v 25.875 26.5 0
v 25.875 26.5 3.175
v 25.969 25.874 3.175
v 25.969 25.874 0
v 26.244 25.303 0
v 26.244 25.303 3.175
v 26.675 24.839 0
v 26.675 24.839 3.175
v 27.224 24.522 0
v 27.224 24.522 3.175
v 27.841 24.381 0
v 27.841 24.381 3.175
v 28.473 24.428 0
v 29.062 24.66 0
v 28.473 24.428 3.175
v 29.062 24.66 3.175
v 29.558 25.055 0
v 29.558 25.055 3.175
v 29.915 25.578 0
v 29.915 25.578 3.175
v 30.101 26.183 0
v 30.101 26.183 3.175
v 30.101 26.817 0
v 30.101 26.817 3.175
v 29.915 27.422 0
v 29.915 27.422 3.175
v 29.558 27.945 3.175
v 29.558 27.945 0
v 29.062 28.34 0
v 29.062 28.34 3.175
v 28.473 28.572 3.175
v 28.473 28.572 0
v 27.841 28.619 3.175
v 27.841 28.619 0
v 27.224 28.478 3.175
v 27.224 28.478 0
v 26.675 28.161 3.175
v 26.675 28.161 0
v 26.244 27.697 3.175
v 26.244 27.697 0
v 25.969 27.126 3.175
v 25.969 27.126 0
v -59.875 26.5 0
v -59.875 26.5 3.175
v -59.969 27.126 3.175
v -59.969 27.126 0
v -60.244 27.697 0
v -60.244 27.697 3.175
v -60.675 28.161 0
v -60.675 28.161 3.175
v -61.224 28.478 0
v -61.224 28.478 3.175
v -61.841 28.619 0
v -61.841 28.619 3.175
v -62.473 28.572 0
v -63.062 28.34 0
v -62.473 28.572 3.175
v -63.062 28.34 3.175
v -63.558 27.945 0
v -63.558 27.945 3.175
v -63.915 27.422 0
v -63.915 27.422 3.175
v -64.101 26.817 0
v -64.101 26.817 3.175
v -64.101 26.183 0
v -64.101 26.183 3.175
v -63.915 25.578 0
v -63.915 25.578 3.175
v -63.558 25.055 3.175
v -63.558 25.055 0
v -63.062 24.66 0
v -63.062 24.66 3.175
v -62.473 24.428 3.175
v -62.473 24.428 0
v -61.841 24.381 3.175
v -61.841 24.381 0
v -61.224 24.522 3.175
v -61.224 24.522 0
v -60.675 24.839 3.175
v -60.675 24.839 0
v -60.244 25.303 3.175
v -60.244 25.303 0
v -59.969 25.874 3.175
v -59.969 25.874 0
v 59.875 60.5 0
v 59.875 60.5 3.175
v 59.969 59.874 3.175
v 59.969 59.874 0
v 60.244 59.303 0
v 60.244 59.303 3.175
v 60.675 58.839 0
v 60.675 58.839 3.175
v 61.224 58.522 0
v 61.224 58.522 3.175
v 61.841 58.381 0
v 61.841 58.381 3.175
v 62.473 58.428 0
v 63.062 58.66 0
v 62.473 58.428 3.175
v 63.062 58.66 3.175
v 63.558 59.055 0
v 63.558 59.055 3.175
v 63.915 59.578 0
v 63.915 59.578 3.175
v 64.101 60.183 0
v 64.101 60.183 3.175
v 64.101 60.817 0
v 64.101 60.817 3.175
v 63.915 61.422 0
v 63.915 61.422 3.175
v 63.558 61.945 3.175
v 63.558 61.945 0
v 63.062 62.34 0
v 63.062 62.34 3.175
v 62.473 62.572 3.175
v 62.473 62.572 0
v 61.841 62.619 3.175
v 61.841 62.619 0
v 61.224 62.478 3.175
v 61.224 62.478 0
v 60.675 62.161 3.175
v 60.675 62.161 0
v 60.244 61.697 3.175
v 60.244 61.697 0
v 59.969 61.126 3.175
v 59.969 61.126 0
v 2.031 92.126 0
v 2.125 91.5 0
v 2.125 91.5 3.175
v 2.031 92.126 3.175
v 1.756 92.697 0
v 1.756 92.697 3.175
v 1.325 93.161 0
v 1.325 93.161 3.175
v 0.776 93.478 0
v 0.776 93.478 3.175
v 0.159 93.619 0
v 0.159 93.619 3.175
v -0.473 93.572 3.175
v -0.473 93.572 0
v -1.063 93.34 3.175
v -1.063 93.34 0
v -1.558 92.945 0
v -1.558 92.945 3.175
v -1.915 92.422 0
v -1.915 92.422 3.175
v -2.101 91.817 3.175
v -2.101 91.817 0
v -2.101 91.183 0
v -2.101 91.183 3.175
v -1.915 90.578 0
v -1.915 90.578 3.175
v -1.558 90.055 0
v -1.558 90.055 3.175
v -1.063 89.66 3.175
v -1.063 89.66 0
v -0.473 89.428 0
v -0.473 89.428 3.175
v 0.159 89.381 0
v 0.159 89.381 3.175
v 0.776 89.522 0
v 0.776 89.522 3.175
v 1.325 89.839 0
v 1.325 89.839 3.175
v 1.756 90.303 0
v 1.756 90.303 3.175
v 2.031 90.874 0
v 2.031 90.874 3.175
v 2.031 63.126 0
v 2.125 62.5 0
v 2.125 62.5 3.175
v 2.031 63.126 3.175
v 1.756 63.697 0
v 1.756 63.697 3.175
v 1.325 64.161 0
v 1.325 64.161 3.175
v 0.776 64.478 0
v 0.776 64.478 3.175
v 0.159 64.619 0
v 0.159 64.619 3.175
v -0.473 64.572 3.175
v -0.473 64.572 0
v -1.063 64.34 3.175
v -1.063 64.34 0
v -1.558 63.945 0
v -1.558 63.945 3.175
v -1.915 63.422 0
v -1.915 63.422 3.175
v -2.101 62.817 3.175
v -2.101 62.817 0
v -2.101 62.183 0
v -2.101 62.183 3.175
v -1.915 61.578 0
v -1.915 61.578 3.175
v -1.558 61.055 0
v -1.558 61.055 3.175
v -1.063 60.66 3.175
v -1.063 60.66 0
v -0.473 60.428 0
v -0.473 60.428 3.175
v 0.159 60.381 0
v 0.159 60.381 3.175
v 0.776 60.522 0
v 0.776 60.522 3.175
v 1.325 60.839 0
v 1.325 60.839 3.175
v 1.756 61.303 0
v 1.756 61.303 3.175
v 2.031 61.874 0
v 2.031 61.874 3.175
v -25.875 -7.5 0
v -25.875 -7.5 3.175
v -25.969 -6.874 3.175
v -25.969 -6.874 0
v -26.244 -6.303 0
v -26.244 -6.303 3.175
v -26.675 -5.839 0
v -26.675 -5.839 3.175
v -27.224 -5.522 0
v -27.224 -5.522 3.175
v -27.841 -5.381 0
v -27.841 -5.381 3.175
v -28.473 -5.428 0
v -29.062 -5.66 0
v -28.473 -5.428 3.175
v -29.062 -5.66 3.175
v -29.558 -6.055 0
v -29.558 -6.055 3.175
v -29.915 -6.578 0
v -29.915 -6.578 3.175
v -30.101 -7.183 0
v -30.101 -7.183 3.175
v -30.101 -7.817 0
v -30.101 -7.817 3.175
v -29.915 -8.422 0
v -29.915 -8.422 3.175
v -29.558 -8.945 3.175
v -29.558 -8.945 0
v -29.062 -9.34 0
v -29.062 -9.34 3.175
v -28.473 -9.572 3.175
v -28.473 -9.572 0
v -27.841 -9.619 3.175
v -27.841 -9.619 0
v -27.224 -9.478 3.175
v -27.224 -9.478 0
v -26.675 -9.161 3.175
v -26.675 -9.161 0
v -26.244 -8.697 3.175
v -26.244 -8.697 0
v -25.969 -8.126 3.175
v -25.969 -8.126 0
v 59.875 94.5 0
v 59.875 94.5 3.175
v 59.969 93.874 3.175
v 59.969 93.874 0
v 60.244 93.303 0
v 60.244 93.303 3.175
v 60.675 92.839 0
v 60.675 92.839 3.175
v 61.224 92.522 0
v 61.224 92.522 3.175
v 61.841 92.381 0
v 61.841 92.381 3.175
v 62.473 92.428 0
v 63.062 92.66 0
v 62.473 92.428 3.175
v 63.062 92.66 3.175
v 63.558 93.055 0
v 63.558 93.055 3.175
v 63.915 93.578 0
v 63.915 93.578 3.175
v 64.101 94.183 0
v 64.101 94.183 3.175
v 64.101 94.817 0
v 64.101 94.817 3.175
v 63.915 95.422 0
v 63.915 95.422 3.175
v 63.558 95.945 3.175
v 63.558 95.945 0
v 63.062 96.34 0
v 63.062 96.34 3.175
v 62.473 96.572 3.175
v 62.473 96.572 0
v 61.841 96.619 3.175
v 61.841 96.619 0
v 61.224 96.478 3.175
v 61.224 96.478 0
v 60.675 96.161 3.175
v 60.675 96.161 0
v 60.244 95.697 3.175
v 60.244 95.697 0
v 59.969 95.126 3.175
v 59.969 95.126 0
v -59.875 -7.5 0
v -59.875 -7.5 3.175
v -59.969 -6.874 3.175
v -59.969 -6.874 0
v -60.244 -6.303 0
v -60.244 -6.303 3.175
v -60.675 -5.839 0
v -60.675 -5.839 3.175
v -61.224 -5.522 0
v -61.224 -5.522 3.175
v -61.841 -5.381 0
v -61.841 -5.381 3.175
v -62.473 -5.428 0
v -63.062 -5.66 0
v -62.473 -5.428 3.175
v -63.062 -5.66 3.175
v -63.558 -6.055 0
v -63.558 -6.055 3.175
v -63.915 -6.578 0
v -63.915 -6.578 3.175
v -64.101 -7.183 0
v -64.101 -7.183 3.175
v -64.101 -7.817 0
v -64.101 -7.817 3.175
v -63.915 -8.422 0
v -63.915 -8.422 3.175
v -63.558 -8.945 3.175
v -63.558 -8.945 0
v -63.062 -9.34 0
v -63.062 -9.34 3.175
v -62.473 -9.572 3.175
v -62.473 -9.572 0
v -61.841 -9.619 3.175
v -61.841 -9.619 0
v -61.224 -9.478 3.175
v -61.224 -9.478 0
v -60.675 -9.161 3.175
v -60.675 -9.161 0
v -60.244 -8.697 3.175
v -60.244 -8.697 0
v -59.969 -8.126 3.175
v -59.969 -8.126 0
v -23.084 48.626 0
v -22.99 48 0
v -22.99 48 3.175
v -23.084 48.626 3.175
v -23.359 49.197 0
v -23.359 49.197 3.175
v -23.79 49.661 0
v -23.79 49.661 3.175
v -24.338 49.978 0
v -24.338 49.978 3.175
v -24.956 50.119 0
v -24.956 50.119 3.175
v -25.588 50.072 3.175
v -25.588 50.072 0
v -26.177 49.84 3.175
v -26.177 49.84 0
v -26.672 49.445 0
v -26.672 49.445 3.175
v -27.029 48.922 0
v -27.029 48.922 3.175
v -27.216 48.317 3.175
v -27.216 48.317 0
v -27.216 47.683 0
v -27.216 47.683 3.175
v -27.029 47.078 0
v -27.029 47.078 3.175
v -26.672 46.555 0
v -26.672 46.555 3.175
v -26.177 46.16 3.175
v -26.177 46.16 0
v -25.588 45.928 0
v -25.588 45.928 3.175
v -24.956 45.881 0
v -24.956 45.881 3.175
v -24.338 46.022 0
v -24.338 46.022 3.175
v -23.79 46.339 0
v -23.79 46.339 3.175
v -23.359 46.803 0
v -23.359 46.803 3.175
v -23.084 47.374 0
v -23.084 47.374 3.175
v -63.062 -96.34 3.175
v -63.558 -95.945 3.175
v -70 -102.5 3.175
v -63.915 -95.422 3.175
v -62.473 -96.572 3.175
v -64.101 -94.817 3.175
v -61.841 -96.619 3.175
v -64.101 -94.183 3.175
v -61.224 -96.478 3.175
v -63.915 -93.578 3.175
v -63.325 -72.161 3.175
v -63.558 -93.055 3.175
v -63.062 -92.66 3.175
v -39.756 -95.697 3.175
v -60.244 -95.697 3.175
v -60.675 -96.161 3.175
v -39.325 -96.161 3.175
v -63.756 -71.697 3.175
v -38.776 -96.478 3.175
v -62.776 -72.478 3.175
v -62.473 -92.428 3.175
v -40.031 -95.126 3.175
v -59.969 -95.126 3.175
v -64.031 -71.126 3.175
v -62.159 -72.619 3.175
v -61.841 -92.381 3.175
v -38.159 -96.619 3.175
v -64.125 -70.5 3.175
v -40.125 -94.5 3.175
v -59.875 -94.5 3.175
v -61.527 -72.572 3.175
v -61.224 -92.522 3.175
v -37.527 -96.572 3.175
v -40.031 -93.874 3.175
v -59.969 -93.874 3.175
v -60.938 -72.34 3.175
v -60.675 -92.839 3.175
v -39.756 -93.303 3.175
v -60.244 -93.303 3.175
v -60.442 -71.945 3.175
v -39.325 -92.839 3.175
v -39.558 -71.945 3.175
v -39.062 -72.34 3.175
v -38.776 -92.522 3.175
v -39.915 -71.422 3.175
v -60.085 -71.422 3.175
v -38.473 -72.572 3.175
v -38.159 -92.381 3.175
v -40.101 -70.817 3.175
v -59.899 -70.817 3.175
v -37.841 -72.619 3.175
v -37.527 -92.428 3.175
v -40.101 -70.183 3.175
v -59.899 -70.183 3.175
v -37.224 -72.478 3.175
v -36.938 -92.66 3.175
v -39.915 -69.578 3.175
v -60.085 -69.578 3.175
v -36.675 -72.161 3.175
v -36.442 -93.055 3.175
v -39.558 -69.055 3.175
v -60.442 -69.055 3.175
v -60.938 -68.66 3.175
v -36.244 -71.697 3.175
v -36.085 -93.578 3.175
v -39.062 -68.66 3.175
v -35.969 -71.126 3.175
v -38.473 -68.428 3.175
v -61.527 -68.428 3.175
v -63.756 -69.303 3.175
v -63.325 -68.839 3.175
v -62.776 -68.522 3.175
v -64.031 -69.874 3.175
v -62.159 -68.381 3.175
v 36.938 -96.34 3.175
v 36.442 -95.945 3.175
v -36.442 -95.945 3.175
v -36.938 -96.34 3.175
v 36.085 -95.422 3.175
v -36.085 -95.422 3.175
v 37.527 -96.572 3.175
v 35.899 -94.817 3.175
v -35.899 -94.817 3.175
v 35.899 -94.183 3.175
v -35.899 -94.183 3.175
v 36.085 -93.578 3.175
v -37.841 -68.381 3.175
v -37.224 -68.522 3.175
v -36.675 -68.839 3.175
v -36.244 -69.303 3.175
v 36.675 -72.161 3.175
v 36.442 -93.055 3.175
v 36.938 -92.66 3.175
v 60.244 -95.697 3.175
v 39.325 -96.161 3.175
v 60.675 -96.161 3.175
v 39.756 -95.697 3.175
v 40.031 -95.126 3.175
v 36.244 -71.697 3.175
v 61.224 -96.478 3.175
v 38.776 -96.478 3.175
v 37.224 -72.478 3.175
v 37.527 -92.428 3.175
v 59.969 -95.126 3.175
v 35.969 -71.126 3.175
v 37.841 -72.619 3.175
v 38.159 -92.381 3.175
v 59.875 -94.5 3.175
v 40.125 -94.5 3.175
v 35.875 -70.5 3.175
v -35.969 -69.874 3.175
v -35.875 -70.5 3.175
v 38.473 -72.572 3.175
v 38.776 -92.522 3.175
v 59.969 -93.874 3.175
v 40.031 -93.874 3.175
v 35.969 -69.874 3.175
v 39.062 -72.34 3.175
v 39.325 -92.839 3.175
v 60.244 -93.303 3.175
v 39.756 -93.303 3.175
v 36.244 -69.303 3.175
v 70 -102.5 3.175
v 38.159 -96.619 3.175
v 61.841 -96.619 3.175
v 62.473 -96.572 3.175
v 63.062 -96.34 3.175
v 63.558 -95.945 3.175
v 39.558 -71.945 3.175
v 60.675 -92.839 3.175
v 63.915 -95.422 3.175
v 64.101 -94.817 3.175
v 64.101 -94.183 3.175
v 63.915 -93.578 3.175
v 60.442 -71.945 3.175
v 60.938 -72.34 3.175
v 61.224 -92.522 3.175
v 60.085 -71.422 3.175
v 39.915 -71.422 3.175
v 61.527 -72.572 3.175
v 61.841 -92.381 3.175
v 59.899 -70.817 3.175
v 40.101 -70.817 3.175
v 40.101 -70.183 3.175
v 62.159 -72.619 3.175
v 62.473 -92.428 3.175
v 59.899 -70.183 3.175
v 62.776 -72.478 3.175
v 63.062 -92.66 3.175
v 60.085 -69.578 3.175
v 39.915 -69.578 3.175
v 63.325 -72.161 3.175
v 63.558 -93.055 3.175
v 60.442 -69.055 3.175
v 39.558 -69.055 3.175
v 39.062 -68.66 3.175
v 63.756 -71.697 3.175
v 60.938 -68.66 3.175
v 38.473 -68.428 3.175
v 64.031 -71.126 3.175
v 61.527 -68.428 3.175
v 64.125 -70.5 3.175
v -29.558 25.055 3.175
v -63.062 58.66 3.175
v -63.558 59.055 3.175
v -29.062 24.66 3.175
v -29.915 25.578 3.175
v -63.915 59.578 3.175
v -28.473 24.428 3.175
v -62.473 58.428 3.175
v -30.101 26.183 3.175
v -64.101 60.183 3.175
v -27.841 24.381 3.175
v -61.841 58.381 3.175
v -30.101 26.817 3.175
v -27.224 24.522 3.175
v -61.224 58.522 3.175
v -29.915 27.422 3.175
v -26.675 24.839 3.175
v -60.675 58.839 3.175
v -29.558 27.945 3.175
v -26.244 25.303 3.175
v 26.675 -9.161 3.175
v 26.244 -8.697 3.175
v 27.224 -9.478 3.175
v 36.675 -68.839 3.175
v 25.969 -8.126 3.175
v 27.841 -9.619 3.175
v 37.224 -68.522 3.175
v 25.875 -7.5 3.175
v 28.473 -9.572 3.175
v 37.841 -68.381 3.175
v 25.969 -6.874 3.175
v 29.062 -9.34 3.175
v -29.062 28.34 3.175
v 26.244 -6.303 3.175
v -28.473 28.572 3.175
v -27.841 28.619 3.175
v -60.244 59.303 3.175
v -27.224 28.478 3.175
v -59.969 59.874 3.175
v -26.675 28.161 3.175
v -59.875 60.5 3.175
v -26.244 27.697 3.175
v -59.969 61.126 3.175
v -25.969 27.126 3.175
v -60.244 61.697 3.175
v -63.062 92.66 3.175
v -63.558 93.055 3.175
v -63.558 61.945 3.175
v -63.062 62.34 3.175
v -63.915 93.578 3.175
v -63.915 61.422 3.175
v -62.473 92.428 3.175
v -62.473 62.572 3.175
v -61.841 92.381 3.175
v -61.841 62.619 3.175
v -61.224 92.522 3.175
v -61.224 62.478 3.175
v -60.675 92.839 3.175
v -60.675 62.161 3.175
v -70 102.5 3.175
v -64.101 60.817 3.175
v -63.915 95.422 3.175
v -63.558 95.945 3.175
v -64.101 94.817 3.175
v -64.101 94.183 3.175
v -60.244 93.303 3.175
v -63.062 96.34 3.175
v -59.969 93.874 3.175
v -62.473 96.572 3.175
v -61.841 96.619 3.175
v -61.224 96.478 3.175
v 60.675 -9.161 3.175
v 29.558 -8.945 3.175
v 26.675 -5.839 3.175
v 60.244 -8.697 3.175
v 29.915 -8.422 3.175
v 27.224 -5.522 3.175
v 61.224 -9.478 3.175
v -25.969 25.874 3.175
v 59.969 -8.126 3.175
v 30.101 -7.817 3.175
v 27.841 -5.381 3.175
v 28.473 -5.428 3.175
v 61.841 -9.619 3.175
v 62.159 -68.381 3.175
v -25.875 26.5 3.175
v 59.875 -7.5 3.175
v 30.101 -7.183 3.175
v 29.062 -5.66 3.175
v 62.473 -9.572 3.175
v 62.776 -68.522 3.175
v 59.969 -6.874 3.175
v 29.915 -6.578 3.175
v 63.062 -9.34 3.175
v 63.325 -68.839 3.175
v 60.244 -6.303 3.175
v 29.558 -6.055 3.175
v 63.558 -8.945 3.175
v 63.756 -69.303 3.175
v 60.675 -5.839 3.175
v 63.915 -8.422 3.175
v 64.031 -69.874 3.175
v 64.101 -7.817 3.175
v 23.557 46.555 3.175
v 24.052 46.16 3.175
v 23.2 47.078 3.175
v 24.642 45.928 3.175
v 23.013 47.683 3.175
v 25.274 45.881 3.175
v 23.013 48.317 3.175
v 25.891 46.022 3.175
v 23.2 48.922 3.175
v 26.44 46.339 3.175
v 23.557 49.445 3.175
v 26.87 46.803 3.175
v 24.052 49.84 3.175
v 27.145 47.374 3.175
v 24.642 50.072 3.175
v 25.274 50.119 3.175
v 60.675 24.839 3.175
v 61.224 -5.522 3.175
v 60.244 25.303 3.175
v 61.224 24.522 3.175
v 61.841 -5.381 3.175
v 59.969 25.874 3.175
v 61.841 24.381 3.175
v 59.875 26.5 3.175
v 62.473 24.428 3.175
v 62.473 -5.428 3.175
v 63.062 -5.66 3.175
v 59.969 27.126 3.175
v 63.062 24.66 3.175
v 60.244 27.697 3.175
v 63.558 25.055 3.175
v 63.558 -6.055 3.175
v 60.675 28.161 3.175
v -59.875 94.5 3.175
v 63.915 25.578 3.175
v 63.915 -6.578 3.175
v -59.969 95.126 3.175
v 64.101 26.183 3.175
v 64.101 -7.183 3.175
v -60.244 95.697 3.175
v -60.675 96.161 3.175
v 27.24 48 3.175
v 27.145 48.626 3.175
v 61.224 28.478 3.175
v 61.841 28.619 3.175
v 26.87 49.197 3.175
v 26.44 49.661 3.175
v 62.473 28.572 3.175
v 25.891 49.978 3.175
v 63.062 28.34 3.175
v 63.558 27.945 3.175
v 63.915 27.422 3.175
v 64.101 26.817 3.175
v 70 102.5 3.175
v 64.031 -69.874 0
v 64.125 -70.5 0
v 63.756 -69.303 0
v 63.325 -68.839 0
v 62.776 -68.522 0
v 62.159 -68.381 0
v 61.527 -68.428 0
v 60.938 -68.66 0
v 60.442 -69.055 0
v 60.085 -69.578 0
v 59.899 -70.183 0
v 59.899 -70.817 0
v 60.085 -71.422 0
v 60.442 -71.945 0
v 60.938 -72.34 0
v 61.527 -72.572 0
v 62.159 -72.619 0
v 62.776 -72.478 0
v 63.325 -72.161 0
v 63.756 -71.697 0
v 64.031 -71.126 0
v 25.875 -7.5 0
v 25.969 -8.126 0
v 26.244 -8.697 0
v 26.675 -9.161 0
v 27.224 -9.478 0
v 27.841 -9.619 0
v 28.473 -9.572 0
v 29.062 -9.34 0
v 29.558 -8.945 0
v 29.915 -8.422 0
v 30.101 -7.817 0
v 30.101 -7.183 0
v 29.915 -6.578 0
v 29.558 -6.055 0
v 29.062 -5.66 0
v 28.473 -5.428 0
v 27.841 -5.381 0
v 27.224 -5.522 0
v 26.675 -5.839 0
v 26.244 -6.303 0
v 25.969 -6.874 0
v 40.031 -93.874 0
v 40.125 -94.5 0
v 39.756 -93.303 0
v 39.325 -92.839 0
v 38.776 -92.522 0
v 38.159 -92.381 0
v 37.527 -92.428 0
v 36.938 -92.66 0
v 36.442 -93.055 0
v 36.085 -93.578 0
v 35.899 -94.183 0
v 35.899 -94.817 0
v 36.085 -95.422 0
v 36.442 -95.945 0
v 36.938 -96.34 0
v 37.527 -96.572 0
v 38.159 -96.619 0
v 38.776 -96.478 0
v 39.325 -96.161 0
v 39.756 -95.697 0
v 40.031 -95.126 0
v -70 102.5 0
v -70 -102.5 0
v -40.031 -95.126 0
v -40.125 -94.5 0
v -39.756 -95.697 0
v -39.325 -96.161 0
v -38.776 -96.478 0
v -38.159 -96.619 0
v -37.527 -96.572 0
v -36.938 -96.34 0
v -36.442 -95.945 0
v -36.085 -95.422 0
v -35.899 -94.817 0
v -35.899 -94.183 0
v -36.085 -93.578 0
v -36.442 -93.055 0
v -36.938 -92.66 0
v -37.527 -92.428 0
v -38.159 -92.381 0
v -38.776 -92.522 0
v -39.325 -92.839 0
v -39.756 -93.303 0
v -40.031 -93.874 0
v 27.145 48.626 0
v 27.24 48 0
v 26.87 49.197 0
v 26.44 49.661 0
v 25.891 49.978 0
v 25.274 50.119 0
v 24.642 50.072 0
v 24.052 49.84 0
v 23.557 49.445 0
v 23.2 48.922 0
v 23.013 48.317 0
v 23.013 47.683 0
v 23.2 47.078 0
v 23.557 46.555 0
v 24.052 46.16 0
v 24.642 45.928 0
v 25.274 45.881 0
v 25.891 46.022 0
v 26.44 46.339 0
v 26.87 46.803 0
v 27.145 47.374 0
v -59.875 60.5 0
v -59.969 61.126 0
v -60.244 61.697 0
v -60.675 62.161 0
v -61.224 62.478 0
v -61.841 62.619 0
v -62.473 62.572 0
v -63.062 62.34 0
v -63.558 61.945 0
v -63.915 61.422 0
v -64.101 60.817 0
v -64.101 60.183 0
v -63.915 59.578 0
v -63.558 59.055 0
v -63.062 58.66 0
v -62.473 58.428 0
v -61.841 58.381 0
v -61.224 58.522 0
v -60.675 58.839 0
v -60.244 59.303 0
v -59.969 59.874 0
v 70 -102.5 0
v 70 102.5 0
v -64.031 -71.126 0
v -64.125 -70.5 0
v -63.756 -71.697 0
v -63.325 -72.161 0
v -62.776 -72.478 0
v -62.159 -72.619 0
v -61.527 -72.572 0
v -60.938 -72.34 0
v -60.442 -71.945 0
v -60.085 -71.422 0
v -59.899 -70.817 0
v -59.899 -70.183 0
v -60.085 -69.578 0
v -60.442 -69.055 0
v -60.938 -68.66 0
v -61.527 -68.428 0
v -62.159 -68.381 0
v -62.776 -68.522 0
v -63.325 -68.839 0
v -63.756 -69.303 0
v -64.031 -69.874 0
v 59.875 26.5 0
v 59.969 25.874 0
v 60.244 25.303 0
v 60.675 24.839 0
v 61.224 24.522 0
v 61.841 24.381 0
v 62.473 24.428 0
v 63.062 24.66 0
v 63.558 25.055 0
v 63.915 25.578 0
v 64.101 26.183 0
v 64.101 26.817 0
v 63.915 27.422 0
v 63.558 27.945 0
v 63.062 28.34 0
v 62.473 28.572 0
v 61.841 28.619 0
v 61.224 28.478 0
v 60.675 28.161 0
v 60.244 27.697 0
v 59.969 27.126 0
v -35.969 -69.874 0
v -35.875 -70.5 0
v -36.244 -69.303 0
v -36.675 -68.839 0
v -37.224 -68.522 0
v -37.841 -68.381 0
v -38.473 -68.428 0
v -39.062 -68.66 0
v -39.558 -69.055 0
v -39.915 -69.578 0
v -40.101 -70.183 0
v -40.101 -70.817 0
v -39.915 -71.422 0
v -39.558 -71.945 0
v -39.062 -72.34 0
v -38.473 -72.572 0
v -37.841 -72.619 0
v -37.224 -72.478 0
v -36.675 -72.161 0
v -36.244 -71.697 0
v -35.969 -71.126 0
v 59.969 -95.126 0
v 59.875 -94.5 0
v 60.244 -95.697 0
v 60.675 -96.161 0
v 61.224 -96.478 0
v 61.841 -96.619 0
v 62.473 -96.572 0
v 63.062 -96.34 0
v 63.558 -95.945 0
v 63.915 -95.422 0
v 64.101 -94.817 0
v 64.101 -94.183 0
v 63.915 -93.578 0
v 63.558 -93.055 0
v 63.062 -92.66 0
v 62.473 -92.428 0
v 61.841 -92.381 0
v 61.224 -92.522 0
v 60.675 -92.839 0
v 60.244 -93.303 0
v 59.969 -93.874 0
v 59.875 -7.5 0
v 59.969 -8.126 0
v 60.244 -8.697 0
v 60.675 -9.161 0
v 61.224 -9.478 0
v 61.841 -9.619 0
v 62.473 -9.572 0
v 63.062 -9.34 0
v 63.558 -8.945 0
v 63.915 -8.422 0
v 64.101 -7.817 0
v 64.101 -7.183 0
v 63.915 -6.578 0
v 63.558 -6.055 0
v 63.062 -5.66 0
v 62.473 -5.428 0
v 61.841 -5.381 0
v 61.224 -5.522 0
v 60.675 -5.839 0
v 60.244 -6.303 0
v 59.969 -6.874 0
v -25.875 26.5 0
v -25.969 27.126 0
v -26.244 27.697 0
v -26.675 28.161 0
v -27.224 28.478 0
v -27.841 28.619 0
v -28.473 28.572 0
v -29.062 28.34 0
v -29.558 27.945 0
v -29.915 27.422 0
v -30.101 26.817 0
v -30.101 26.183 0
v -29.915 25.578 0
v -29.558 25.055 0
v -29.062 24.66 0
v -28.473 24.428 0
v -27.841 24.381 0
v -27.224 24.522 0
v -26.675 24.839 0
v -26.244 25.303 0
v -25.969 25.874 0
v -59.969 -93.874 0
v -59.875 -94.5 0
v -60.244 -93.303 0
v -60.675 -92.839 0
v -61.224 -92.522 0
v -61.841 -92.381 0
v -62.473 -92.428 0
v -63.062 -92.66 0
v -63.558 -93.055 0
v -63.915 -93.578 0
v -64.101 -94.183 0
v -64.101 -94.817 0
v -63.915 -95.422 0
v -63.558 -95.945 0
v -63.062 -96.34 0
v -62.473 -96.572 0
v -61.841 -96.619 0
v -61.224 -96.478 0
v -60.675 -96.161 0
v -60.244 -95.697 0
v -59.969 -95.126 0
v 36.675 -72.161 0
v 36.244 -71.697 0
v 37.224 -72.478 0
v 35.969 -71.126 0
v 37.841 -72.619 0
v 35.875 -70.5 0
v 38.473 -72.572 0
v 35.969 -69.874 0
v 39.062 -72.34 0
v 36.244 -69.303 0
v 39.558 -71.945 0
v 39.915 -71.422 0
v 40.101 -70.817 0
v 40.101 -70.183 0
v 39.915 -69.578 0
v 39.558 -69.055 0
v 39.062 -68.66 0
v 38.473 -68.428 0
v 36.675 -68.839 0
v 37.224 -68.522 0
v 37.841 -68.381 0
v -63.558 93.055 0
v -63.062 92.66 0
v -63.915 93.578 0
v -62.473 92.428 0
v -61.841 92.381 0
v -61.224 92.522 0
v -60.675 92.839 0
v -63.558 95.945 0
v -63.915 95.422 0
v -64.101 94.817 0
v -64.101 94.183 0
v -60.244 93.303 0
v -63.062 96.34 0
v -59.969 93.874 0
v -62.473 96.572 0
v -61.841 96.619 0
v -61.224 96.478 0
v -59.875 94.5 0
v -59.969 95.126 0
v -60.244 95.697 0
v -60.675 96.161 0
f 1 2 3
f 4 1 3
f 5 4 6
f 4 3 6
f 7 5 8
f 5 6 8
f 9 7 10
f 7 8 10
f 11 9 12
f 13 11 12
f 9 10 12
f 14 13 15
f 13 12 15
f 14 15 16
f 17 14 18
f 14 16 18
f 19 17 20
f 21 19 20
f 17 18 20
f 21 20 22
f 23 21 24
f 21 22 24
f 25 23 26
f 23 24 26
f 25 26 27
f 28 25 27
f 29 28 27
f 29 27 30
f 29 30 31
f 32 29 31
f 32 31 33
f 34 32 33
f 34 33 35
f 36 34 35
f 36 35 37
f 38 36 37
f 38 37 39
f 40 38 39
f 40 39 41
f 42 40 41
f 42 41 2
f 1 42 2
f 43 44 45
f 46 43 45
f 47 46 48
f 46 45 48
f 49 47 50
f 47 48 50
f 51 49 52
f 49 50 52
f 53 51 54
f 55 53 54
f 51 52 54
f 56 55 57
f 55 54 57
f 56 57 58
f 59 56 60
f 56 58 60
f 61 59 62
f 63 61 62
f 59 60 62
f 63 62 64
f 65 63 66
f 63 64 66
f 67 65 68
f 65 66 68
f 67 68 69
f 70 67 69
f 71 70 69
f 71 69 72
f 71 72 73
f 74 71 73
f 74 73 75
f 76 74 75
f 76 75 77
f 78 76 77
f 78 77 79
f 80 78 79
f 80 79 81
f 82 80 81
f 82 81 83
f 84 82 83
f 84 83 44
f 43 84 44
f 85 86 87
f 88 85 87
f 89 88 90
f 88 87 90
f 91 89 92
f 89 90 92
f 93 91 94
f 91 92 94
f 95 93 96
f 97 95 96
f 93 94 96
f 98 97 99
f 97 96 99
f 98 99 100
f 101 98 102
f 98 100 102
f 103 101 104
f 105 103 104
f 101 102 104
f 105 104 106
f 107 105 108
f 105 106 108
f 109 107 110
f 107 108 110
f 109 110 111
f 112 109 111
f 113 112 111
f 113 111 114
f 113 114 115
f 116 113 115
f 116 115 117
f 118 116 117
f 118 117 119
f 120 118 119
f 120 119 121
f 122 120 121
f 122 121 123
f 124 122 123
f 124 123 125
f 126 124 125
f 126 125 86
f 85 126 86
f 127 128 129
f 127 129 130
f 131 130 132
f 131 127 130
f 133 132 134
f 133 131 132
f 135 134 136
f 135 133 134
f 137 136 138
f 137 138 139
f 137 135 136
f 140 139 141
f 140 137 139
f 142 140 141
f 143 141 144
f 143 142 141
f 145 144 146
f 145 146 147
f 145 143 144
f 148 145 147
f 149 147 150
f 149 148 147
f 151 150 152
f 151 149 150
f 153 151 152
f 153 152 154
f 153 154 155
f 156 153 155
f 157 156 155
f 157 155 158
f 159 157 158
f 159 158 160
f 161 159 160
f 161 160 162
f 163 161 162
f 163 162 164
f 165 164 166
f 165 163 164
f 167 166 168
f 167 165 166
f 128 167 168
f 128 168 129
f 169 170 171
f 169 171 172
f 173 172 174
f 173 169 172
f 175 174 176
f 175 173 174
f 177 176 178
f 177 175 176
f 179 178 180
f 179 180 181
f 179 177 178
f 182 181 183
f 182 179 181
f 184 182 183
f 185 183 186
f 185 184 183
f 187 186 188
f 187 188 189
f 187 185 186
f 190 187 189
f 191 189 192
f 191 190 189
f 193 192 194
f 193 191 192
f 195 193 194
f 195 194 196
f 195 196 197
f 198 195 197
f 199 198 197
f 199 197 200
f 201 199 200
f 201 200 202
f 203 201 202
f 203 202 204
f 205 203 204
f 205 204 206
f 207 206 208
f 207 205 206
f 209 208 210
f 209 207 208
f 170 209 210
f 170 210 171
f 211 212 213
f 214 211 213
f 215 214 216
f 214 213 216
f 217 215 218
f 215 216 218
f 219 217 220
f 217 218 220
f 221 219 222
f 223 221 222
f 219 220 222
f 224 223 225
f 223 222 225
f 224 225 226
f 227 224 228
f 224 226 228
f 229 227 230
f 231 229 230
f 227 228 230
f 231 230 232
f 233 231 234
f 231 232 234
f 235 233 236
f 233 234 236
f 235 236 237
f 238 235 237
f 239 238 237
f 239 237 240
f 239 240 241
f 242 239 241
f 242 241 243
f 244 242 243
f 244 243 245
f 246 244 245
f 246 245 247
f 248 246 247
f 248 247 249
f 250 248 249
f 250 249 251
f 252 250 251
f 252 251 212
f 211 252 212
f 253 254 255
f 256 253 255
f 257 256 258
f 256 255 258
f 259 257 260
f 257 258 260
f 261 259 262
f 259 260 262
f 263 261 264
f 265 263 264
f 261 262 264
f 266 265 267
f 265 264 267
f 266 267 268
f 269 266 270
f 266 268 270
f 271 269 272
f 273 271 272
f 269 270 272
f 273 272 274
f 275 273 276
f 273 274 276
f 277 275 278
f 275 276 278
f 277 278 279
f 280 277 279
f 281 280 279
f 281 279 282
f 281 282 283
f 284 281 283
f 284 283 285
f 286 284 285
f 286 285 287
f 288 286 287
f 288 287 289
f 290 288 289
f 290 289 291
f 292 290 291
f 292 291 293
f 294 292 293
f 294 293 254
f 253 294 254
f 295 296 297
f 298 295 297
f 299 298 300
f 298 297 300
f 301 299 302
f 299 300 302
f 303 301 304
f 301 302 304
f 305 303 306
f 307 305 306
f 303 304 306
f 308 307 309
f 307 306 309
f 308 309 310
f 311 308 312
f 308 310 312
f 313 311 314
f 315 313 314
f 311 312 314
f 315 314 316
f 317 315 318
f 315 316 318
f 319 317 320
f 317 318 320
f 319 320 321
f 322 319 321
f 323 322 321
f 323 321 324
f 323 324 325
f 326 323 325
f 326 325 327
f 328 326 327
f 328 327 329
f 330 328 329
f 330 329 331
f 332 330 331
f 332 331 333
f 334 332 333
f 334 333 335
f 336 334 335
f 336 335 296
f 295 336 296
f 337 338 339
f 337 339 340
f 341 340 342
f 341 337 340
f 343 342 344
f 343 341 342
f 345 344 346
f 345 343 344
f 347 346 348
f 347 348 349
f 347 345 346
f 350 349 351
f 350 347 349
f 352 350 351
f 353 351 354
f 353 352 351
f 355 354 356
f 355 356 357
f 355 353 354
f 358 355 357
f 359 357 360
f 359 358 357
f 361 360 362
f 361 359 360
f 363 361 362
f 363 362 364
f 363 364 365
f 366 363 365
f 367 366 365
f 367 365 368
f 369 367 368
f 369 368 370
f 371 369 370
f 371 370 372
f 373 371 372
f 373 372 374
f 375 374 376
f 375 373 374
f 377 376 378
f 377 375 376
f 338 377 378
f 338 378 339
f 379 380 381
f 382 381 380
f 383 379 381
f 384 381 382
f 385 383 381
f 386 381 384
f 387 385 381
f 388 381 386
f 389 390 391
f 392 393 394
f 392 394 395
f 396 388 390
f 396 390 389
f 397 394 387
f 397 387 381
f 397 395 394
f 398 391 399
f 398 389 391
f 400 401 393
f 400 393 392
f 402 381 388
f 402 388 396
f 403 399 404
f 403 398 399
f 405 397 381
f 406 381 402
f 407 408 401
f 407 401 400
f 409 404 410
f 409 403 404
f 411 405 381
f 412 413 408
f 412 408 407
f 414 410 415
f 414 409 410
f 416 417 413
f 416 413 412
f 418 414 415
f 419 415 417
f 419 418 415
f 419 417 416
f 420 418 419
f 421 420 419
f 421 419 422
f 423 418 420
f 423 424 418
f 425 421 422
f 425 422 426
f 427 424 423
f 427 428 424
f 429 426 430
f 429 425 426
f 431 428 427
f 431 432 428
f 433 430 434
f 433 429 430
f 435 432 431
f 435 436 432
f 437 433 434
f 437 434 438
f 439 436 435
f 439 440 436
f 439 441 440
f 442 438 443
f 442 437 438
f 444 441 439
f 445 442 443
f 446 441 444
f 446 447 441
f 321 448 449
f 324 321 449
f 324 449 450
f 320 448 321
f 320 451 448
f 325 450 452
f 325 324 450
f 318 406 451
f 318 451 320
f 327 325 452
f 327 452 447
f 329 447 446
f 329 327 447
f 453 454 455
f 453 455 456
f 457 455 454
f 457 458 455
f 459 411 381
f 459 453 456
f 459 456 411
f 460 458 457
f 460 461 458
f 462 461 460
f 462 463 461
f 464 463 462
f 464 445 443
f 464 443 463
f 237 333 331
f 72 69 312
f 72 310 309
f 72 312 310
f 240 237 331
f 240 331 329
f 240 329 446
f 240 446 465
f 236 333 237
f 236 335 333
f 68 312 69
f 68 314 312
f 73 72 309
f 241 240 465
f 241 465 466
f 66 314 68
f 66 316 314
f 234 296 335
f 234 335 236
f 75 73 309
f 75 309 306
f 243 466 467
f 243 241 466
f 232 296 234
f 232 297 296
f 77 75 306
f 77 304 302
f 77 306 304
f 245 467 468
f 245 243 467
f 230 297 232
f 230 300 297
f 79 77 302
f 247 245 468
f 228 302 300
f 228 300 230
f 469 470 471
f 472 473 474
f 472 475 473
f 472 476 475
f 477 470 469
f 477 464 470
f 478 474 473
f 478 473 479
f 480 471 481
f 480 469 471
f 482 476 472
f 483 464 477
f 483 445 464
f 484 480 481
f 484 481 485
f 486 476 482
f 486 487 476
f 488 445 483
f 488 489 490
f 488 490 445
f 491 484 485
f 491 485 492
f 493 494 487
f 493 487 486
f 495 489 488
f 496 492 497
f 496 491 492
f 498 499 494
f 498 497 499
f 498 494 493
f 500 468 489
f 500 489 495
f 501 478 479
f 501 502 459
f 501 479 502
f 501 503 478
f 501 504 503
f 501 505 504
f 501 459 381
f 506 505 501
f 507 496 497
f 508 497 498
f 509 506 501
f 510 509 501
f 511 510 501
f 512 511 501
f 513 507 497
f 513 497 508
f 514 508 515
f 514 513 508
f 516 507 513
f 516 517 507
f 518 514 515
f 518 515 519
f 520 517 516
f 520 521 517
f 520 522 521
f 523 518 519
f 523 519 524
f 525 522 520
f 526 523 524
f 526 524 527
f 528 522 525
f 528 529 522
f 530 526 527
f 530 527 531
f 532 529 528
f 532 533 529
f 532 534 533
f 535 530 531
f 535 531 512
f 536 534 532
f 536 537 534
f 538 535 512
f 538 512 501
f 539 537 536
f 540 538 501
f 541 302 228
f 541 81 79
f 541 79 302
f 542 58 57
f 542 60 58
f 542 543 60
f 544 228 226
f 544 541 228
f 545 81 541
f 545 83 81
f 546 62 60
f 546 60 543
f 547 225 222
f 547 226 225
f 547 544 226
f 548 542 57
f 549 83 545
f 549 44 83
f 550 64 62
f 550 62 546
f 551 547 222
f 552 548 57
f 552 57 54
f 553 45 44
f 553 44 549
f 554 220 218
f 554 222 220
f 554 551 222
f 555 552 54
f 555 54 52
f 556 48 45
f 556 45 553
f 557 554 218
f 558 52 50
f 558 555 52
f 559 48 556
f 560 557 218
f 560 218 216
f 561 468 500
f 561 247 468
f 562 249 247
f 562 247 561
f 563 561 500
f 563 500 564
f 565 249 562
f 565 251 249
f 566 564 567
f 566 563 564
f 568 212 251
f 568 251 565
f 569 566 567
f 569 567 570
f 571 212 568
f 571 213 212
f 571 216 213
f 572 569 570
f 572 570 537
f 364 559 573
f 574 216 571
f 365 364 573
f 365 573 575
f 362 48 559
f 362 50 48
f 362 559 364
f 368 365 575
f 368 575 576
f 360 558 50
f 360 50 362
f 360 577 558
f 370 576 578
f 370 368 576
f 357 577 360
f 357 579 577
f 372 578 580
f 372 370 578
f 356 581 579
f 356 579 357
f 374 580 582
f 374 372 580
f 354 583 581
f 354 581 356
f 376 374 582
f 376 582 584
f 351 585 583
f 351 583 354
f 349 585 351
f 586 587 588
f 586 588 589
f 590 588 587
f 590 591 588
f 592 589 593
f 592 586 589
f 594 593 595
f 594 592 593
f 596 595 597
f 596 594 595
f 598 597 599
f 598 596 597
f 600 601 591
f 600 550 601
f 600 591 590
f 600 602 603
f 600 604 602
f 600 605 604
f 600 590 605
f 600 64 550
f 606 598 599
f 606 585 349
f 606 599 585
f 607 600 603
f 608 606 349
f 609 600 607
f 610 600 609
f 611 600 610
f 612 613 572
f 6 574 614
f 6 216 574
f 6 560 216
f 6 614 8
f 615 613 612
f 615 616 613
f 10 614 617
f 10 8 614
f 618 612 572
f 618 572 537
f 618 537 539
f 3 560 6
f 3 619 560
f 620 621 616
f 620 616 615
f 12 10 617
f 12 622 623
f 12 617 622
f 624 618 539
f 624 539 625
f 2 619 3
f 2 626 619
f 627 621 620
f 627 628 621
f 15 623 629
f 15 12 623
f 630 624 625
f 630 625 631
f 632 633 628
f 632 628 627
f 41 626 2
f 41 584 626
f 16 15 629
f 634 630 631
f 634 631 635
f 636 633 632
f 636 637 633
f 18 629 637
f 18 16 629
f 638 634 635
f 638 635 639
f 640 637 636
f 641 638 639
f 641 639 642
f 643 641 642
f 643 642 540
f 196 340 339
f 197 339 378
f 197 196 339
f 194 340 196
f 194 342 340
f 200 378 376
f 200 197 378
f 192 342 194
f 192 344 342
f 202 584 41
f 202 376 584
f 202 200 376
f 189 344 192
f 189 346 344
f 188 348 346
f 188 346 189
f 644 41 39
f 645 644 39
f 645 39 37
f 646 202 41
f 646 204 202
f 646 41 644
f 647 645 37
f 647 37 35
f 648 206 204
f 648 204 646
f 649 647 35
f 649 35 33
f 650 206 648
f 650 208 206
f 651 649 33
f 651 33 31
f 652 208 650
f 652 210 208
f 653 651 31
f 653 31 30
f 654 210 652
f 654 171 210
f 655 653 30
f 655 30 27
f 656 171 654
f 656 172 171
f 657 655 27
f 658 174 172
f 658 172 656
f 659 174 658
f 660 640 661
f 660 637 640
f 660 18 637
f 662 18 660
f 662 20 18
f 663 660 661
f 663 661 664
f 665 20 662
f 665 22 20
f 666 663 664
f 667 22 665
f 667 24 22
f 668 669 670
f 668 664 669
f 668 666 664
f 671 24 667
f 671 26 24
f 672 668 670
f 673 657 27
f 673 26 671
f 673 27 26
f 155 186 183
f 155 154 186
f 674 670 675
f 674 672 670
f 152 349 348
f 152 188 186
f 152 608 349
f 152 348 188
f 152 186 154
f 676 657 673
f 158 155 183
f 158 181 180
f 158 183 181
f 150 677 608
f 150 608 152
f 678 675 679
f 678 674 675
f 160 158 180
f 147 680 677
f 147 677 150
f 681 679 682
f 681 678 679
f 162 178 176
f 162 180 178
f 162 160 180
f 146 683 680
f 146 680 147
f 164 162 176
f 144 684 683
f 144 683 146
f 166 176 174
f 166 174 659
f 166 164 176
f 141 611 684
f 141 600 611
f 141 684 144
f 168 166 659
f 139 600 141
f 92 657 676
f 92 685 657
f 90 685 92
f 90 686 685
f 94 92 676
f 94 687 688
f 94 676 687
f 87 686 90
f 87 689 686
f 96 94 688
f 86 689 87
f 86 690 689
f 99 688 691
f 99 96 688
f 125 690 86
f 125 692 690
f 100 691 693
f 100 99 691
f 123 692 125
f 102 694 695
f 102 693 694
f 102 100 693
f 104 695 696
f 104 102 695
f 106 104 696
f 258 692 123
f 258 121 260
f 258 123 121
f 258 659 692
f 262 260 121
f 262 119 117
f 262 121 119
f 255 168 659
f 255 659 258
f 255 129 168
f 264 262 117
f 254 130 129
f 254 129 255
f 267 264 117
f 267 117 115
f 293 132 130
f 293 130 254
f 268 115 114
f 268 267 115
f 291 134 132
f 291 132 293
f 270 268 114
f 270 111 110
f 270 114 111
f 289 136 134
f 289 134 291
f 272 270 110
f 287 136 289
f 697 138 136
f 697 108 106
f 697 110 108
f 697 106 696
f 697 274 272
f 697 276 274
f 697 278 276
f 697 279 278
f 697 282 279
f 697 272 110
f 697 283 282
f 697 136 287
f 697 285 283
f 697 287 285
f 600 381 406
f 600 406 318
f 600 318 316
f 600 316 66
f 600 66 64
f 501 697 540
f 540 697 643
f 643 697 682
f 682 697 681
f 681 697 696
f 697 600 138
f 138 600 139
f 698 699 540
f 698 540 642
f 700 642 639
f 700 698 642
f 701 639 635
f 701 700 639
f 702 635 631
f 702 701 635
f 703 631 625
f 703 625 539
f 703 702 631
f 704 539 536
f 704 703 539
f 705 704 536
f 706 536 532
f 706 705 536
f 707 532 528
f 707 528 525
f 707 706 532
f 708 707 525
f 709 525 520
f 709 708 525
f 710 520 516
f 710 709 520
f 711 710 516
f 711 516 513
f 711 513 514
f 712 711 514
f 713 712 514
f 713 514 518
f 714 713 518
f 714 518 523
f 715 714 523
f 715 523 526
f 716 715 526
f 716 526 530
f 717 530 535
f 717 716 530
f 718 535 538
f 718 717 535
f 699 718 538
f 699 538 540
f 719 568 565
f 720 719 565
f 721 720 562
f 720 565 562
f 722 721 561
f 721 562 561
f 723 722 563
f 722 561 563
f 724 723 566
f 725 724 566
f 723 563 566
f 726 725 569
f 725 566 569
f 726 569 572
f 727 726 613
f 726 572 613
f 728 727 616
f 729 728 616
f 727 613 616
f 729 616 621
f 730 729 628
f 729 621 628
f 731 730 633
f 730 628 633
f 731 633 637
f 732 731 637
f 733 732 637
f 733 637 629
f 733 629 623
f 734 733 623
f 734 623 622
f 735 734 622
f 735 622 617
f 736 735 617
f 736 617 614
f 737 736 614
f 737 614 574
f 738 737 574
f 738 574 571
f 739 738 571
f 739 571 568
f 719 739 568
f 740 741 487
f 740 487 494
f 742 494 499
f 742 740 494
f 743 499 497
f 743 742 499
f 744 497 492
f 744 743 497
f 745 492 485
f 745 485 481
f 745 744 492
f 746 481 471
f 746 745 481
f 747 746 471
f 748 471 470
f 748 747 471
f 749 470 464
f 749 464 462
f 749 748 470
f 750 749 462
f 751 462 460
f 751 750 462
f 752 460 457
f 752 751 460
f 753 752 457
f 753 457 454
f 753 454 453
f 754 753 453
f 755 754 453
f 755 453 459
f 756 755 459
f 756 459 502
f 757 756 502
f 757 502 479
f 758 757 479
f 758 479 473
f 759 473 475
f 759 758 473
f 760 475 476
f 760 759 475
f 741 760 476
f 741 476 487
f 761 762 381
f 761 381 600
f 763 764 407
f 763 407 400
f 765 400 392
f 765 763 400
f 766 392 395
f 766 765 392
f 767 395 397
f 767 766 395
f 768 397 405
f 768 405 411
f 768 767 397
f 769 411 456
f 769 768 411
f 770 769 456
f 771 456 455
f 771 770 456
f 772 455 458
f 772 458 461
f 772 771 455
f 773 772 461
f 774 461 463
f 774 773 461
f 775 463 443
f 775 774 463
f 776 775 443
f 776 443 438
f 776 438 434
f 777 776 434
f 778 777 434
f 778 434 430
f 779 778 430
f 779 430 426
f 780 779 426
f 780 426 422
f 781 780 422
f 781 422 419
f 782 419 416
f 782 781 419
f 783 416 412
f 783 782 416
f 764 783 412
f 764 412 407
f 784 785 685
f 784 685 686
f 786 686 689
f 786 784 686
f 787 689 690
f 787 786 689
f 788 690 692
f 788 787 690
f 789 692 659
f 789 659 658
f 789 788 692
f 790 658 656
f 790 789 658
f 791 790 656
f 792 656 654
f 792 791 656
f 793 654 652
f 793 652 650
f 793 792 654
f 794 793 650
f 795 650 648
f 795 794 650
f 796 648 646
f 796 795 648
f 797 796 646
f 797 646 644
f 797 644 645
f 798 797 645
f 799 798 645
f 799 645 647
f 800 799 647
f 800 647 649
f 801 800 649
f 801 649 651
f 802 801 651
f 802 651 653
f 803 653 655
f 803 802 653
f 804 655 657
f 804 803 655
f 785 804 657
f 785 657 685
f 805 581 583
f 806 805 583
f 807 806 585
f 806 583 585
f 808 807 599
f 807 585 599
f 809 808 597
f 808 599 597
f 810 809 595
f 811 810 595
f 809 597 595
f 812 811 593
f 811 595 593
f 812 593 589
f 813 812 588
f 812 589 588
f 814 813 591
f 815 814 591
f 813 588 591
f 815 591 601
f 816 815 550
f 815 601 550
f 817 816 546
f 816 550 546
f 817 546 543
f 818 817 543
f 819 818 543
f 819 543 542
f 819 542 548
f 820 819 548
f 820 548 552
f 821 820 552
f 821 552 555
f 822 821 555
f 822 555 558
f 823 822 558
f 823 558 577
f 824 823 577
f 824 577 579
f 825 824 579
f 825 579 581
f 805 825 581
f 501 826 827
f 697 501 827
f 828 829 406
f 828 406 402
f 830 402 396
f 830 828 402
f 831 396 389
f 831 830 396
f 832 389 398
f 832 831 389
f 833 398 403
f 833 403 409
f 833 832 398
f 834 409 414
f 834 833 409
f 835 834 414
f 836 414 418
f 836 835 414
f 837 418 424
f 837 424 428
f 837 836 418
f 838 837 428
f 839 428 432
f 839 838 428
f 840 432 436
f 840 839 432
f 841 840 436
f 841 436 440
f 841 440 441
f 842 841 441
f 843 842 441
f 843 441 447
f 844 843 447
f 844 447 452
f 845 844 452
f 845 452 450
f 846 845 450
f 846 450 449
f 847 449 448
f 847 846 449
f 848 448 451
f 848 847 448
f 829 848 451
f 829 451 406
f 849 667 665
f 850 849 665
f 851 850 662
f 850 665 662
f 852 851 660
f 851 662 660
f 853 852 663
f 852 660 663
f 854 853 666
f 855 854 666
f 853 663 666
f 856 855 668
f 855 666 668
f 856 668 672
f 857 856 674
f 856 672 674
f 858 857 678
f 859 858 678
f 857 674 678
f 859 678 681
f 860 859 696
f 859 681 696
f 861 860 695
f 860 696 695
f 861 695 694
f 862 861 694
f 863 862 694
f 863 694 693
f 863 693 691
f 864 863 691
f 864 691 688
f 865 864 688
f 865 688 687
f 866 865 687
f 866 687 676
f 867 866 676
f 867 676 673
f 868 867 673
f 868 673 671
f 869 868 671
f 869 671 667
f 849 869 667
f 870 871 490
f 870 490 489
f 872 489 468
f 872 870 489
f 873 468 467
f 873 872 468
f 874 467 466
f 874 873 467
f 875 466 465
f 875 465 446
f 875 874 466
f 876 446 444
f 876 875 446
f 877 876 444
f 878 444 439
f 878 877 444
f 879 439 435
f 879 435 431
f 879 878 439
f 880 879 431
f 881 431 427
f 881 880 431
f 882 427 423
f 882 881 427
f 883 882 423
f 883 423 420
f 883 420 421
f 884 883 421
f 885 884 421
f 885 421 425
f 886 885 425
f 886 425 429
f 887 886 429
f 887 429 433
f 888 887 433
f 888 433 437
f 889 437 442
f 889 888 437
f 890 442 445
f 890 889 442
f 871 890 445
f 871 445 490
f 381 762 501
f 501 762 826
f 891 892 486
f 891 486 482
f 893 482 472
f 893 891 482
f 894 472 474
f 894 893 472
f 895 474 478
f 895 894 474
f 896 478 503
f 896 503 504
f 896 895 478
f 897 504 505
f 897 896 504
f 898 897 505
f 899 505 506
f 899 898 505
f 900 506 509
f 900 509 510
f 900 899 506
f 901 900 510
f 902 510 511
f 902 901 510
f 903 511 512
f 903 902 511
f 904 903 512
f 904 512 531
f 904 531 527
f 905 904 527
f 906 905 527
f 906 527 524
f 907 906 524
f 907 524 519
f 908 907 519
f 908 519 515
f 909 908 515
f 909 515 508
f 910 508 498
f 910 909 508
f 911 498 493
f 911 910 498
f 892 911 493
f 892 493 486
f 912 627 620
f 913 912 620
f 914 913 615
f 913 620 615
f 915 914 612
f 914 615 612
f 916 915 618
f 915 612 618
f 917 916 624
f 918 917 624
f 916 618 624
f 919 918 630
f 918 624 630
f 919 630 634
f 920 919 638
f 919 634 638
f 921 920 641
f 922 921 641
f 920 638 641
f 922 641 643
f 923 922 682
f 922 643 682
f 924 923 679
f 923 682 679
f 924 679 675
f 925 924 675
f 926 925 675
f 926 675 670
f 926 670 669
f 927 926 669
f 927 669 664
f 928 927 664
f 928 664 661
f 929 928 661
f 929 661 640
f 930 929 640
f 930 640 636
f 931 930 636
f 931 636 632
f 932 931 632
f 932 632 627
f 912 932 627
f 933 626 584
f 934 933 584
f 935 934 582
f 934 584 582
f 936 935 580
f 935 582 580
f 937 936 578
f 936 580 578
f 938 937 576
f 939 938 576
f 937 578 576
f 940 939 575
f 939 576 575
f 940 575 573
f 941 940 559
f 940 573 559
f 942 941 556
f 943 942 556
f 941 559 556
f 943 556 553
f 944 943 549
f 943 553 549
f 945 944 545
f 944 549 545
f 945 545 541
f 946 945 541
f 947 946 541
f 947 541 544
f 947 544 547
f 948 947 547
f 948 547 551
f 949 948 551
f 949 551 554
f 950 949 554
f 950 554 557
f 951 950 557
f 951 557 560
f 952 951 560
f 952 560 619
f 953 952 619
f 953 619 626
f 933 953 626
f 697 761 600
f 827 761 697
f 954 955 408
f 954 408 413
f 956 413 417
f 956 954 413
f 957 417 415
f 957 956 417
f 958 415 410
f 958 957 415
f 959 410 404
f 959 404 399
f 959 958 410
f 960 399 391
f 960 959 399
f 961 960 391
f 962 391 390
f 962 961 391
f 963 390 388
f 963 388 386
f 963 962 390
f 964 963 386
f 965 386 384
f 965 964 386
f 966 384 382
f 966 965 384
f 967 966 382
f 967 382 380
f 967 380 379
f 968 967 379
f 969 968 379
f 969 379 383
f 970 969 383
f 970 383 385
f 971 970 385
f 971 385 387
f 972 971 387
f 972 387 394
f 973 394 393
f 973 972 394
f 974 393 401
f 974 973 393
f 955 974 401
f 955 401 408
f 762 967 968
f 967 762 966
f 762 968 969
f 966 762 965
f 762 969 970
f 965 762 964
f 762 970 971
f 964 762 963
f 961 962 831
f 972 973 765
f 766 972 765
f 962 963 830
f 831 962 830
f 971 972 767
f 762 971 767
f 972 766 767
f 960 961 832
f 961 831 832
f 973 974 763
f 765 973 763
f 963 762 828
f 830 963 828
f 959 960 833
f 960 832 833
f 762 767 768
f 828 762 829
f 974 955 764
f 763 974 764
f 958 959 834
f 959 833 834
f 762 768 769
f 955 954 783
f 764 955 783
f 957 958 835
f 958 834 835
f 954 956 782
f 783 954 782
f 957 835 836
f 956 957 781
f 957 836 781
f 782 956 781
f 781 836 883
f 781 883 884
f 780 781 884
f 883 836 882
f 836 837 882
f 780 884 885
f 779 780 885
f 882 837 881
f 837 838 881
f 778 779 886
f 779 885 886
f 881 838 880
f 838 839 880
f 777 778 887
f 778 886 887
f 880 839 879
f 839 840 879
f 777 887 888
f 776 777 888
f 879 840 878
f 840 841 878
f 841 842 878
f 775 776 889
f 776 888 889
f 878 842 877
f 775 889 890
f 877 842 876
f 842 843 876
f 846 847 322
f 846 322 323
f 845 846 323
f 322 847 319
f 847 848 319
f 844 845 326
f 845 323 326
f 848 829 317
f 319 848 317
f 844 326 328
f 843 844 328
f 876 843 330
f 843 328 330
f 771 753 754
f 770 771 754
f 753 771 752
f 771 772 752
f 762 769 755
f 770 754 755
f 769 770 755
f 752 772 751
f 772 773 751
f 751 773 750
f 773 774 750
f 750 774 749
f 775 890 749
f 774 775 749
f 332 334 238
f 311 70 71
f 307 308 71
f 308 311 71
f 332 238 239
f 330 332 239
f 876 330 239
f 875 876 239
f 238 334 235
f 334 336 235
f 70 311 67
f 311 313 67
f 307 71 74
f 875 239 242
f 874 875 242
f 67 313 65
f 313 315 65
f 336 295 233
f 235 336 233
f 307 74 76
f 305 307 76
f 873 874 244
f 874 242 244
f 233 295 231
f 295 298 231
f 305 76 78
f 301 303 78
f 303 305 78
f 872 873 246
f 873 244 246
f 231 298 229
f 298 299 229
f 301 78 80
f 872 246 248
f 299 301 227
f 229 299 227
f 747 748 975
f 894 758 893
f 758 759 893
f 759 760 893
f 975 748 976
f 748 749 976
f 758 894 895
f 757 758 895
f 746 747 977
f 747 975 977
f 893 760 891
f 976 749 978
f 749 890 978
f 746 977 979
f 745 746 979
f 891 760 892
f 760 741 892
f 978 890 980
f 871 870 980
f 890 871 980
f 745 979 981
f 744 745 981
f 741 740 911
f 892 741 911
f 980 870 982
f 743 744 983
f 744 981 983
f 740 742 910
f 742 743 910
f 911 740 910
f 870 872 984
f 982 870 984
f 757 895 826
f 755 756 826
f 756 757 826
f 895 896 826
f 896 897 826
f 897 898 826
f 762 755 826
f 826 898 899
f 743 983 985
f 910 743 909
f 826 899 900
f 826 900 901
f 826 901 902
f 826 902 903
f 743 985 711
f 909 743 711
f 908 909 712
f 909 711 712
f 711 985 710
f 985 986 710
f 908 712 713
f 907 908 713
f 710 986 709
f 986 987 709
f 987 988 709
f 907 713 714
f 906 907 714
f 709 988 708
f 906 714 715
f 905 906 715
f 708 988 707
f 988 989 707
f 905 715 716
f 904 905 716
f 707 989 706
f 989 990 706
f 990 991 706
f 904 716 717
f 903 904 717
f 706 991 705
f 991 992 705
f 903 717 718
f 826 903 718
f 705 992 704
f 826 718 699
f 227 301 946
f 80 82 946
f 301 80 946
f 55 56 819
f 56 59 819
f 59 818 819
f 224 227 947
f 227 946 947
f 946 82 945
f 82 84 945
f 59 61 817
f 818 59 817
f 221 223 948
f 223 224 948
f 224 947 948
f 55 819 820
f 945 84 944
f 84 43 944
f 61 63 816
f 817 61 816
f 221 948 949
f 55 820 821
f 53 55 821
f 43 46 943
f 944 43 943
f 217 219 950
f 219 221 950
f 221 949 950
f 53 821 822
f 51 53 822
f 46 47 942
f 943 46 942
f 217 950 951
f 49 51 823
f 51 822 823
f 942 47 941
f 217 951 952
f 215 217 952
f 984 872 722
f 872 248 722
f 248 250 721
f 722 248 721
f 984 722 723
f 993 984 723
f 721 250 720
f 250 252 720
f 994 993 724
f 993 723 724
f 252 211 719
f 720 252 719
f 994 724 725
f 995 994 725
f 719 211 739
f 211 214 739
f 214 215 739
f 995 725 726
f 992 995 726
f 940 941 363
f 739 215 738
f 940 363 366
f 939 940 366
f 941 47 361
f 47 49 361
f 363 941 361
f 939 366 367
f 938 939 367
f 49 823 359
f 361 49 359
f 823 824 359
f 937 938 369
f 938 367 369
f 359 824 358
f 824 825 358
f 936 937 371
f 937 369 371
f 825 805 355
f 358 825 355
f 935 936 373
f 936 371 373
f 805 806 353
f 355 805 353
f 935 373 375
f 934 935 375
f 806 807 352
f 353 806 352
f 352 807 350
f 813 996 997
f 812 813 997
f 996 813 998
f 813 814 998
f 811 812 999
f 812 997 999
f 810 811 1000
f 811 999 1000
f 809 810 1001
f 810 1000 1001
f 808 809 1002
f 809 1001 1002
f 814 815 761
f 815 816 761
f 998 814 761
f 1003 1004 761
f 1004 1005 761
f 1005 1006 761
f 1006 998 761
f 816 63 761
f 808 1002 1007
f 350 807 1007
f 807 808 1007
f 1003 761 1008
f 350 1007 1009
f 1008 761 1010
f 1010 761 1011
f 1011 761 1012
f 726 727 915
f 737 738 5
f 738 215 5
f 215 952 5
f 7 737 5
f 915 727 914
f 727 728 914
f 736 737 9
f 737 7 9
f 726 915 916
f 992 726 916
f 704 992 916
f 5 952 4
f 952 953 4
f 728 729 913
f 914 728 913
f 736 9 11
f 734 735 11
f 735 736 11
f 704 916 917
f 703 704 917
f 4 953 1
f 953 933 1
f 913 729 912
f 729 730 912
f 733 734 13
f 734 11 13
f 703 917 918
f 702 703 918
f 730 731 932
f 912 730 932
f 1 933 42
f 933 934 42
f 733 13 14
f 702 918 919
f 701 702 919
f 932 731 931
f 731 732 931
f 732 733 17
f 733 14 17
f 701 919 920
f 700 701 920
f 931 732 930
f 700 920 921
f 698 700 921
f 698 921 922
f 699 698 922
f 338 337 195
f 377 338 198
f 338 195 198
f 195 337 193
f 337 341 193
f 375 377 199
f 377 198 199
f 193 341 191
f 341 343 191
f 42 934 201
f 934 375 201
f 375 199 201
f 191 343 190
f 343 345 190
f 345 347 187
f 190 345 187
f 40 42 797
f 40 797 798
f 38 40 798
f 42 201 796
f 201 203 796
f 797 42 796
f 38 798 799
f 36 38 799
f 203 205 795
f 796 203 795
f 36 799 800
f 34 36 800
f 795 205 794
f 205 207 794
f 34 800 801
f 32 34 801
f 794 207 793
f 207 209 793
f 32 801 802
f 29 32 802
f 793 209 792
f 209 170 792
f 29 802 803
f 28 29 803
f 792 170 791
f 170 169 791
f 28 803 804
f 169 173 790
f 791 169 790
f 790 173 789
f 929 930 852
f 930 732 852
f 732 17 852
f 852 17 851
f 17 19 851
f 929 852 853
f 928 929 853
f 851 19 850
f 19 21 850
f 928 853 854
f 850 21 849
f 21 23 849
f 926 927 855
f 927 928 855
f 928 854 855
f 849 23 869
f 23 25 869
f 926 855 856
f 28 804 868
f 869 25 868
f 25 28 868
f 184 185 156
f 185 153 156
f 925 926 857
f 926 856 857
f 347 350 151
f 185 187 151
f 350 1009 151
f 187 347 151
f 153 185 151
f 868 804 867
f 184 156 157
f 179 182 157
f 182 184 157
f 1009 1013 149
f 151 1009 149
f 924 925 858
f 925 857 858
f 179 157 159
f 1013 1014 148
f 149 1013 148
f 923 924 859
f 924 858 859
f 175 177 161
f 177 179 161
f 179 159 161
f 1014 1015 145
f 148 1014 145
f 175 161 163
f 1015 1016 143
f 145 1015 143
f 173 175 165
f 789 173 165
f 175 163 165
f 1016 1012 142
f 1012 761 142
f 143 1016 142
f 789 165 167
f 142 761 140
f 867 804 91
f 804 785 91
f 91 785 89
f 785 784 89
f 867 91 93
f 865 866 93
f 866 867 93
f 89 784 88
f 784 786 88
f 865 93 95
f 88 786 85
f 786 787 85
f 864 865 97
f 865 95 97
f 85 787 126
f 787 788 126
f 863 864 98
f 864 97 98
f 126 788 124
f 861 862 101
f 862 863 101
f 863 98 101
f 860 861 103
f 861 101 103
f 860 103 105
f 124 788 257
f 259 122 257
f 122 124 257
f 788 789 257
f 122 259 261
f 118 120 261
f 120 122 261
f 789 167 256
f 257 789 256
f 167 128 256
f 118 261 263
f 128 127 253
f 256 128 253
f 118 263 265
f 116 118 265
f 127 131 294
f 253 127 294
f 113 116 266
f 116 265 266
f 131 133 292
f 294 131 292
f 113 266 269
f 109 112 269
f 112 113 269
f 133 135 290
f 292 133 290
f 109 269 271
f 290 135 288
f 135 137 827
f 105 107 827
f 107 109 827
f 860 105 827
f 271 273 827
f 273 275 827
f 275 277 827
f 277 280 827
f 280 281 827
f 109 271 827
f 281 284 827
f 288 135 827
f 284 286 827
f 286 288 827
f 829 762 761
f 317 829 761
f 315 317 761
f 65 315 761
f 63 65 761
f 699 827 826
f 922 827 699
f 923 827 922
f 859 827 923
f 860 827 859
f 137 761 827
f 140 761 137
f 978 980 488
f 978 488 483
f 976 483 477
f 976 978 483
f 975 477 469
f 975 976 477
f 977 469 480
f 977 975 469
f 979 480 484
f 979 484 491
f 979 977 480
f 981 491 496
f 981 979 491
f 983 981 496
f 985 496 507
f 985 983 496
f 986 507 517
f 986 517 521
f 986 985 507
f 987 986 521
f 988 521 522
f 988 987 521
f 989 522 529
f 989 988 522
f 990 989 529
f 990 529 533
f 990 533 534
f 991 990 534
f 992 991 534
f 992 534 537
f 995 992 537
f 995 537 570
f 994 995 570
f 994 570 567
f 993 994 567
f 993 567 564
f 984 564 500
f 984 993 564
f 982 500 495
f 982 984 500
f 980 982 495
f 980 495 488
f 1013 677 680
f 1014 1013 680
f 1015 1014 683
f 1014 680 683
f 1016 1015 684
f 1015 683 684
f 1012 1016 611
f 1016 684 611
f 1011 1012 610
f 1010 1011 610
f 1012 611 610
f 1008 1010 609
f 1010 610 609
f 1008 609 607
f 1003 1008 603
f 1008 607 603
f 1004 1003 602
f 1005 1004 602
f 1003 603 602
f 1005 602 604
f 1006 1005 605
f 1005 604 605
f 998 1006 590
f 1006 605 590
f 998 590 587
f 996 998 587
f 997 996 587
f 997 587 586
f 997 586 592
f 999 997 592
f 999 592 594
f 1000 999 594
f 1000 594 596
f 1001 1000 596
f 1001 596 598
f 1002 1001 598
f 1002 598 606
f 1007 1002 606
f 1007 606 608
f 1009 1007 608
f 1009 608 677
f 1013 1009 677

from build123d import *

# Parameters (mm, degrees)
SKETCH1_W           = 140
SKETCH1_H           = 205
SKETCH1_R           = 2.125
BOSS_EXTRUDE1_DEPTH = 3.175
SKETCH2_R           = 2.125
CUT_EXTRUDE1_DEPTH  = 125.162516989


with BuildPart() as part:
    # Sketch1 → Boss-Extrude1 (new body)
    with BuildSketch(Plane.XY):
        Rectangle(SKETCH1_W, SKETCH1_H)
        with Locations((0, 91.5)):
            Circle(SKETCH1_R, mode=Mode.SUBTRACT)
        with Locations((25.11473671, 48)):
            Circle(SKETCH1_R, mode=Mode.SUBTRACT)
        with Locations((-25.11473671, 48)):
            Circle(SKETCH1_R, mode=Mode.SUBTRACT)
        with Locations((0, 62.5)):
            Circle(SKETCH1_R, mode=Mode.SUBTRACT)
        with Locations((-62, -94.5)):
            Circle(SKETCH1_R, mode=Mode.SUBTRACT)
        with Locations(Location((-38, -94.5, 0), (0, 0, 180))):
            Circle(SKETCH1_R, mode=Mode.SUBTRACT)
        with Locations((-38, -70.5)):
            Circle(SKETCH1_R, mode=Mode.SUBTRACT)
        with Locations(Location((-62, -70.5, 0), (0, 0, 180))):
            Circle(SKETCH1_R, mode=Mode.SUBTRACT)
        with Locations((38, -94.5)):
            Circle(SKETCH1_R, mode=Mode.SUBTRACT)
        with Locations(Location((62, -94.5, 0), (0, 0, 180))):
            Circle(SKETCH1_R, mode=Mode.SUBTRACT)
        with Locations((62, -70.5)):
            Circle(SKETCH1_R, mode=Mode.SUBTRACT)
        with Locations(Location((38, -70.5, 0), (0, 0, 180))):
            Circle(SKETCH1_R, mode=Mode.SUBTRACT)
    extrude(amount=BOSS_EXTRUDE1_DEPTH)

    # Sketch2 → Cut-Extrude1 (cut, through all)
    with BuildSketch(Plane.XY.offset(3.175)):
        with Locations((-62, 94.5)):
            Circle(SKETCH2_R)
        with Locations((-62, 60.5)):
            Circle(SKETCH2_R)
        with Locations((-62, 26.5)):
            Circle(SKETCH2_R)
        with Locations((-62, -7.5)):
            Circle(SKETCH2_R)
        with Locations((-28, 26.5)):
            Circle(SKETCH2_R)
        with Locations((-28, -7.5)):
            Circle(SKETCH2_R)
        with Locations(Location((28, -7.5, 0), (0, 0, 180))):
            Circle(SKETCH2_R)
        with Locations(Location((28, 26.5, 0), (0, 0, 180))):
            Circle(SKETCH2_R)
        with Locations(Location((62, -7.5, 0), (0, 0, 180))):
            Circle(SKETCH2_R)
        with Locations(Location((62, 26.5, 0), (0, 0, 180))):
            Circle(SKETCH2_R)
        with Locations(Location((62, 60.5, 0), (0, 0, 180))):
            Circle(SKETCH2_R)
        with Locations(Location((62, 94.5, 0), (0, 0, 180))):
            Circle(SKETCH2_R)
    extrude(amount=-CUT_EXTRUDE1_DEPTH, mode=Mode.SUBTRACT)


solid = part.part
